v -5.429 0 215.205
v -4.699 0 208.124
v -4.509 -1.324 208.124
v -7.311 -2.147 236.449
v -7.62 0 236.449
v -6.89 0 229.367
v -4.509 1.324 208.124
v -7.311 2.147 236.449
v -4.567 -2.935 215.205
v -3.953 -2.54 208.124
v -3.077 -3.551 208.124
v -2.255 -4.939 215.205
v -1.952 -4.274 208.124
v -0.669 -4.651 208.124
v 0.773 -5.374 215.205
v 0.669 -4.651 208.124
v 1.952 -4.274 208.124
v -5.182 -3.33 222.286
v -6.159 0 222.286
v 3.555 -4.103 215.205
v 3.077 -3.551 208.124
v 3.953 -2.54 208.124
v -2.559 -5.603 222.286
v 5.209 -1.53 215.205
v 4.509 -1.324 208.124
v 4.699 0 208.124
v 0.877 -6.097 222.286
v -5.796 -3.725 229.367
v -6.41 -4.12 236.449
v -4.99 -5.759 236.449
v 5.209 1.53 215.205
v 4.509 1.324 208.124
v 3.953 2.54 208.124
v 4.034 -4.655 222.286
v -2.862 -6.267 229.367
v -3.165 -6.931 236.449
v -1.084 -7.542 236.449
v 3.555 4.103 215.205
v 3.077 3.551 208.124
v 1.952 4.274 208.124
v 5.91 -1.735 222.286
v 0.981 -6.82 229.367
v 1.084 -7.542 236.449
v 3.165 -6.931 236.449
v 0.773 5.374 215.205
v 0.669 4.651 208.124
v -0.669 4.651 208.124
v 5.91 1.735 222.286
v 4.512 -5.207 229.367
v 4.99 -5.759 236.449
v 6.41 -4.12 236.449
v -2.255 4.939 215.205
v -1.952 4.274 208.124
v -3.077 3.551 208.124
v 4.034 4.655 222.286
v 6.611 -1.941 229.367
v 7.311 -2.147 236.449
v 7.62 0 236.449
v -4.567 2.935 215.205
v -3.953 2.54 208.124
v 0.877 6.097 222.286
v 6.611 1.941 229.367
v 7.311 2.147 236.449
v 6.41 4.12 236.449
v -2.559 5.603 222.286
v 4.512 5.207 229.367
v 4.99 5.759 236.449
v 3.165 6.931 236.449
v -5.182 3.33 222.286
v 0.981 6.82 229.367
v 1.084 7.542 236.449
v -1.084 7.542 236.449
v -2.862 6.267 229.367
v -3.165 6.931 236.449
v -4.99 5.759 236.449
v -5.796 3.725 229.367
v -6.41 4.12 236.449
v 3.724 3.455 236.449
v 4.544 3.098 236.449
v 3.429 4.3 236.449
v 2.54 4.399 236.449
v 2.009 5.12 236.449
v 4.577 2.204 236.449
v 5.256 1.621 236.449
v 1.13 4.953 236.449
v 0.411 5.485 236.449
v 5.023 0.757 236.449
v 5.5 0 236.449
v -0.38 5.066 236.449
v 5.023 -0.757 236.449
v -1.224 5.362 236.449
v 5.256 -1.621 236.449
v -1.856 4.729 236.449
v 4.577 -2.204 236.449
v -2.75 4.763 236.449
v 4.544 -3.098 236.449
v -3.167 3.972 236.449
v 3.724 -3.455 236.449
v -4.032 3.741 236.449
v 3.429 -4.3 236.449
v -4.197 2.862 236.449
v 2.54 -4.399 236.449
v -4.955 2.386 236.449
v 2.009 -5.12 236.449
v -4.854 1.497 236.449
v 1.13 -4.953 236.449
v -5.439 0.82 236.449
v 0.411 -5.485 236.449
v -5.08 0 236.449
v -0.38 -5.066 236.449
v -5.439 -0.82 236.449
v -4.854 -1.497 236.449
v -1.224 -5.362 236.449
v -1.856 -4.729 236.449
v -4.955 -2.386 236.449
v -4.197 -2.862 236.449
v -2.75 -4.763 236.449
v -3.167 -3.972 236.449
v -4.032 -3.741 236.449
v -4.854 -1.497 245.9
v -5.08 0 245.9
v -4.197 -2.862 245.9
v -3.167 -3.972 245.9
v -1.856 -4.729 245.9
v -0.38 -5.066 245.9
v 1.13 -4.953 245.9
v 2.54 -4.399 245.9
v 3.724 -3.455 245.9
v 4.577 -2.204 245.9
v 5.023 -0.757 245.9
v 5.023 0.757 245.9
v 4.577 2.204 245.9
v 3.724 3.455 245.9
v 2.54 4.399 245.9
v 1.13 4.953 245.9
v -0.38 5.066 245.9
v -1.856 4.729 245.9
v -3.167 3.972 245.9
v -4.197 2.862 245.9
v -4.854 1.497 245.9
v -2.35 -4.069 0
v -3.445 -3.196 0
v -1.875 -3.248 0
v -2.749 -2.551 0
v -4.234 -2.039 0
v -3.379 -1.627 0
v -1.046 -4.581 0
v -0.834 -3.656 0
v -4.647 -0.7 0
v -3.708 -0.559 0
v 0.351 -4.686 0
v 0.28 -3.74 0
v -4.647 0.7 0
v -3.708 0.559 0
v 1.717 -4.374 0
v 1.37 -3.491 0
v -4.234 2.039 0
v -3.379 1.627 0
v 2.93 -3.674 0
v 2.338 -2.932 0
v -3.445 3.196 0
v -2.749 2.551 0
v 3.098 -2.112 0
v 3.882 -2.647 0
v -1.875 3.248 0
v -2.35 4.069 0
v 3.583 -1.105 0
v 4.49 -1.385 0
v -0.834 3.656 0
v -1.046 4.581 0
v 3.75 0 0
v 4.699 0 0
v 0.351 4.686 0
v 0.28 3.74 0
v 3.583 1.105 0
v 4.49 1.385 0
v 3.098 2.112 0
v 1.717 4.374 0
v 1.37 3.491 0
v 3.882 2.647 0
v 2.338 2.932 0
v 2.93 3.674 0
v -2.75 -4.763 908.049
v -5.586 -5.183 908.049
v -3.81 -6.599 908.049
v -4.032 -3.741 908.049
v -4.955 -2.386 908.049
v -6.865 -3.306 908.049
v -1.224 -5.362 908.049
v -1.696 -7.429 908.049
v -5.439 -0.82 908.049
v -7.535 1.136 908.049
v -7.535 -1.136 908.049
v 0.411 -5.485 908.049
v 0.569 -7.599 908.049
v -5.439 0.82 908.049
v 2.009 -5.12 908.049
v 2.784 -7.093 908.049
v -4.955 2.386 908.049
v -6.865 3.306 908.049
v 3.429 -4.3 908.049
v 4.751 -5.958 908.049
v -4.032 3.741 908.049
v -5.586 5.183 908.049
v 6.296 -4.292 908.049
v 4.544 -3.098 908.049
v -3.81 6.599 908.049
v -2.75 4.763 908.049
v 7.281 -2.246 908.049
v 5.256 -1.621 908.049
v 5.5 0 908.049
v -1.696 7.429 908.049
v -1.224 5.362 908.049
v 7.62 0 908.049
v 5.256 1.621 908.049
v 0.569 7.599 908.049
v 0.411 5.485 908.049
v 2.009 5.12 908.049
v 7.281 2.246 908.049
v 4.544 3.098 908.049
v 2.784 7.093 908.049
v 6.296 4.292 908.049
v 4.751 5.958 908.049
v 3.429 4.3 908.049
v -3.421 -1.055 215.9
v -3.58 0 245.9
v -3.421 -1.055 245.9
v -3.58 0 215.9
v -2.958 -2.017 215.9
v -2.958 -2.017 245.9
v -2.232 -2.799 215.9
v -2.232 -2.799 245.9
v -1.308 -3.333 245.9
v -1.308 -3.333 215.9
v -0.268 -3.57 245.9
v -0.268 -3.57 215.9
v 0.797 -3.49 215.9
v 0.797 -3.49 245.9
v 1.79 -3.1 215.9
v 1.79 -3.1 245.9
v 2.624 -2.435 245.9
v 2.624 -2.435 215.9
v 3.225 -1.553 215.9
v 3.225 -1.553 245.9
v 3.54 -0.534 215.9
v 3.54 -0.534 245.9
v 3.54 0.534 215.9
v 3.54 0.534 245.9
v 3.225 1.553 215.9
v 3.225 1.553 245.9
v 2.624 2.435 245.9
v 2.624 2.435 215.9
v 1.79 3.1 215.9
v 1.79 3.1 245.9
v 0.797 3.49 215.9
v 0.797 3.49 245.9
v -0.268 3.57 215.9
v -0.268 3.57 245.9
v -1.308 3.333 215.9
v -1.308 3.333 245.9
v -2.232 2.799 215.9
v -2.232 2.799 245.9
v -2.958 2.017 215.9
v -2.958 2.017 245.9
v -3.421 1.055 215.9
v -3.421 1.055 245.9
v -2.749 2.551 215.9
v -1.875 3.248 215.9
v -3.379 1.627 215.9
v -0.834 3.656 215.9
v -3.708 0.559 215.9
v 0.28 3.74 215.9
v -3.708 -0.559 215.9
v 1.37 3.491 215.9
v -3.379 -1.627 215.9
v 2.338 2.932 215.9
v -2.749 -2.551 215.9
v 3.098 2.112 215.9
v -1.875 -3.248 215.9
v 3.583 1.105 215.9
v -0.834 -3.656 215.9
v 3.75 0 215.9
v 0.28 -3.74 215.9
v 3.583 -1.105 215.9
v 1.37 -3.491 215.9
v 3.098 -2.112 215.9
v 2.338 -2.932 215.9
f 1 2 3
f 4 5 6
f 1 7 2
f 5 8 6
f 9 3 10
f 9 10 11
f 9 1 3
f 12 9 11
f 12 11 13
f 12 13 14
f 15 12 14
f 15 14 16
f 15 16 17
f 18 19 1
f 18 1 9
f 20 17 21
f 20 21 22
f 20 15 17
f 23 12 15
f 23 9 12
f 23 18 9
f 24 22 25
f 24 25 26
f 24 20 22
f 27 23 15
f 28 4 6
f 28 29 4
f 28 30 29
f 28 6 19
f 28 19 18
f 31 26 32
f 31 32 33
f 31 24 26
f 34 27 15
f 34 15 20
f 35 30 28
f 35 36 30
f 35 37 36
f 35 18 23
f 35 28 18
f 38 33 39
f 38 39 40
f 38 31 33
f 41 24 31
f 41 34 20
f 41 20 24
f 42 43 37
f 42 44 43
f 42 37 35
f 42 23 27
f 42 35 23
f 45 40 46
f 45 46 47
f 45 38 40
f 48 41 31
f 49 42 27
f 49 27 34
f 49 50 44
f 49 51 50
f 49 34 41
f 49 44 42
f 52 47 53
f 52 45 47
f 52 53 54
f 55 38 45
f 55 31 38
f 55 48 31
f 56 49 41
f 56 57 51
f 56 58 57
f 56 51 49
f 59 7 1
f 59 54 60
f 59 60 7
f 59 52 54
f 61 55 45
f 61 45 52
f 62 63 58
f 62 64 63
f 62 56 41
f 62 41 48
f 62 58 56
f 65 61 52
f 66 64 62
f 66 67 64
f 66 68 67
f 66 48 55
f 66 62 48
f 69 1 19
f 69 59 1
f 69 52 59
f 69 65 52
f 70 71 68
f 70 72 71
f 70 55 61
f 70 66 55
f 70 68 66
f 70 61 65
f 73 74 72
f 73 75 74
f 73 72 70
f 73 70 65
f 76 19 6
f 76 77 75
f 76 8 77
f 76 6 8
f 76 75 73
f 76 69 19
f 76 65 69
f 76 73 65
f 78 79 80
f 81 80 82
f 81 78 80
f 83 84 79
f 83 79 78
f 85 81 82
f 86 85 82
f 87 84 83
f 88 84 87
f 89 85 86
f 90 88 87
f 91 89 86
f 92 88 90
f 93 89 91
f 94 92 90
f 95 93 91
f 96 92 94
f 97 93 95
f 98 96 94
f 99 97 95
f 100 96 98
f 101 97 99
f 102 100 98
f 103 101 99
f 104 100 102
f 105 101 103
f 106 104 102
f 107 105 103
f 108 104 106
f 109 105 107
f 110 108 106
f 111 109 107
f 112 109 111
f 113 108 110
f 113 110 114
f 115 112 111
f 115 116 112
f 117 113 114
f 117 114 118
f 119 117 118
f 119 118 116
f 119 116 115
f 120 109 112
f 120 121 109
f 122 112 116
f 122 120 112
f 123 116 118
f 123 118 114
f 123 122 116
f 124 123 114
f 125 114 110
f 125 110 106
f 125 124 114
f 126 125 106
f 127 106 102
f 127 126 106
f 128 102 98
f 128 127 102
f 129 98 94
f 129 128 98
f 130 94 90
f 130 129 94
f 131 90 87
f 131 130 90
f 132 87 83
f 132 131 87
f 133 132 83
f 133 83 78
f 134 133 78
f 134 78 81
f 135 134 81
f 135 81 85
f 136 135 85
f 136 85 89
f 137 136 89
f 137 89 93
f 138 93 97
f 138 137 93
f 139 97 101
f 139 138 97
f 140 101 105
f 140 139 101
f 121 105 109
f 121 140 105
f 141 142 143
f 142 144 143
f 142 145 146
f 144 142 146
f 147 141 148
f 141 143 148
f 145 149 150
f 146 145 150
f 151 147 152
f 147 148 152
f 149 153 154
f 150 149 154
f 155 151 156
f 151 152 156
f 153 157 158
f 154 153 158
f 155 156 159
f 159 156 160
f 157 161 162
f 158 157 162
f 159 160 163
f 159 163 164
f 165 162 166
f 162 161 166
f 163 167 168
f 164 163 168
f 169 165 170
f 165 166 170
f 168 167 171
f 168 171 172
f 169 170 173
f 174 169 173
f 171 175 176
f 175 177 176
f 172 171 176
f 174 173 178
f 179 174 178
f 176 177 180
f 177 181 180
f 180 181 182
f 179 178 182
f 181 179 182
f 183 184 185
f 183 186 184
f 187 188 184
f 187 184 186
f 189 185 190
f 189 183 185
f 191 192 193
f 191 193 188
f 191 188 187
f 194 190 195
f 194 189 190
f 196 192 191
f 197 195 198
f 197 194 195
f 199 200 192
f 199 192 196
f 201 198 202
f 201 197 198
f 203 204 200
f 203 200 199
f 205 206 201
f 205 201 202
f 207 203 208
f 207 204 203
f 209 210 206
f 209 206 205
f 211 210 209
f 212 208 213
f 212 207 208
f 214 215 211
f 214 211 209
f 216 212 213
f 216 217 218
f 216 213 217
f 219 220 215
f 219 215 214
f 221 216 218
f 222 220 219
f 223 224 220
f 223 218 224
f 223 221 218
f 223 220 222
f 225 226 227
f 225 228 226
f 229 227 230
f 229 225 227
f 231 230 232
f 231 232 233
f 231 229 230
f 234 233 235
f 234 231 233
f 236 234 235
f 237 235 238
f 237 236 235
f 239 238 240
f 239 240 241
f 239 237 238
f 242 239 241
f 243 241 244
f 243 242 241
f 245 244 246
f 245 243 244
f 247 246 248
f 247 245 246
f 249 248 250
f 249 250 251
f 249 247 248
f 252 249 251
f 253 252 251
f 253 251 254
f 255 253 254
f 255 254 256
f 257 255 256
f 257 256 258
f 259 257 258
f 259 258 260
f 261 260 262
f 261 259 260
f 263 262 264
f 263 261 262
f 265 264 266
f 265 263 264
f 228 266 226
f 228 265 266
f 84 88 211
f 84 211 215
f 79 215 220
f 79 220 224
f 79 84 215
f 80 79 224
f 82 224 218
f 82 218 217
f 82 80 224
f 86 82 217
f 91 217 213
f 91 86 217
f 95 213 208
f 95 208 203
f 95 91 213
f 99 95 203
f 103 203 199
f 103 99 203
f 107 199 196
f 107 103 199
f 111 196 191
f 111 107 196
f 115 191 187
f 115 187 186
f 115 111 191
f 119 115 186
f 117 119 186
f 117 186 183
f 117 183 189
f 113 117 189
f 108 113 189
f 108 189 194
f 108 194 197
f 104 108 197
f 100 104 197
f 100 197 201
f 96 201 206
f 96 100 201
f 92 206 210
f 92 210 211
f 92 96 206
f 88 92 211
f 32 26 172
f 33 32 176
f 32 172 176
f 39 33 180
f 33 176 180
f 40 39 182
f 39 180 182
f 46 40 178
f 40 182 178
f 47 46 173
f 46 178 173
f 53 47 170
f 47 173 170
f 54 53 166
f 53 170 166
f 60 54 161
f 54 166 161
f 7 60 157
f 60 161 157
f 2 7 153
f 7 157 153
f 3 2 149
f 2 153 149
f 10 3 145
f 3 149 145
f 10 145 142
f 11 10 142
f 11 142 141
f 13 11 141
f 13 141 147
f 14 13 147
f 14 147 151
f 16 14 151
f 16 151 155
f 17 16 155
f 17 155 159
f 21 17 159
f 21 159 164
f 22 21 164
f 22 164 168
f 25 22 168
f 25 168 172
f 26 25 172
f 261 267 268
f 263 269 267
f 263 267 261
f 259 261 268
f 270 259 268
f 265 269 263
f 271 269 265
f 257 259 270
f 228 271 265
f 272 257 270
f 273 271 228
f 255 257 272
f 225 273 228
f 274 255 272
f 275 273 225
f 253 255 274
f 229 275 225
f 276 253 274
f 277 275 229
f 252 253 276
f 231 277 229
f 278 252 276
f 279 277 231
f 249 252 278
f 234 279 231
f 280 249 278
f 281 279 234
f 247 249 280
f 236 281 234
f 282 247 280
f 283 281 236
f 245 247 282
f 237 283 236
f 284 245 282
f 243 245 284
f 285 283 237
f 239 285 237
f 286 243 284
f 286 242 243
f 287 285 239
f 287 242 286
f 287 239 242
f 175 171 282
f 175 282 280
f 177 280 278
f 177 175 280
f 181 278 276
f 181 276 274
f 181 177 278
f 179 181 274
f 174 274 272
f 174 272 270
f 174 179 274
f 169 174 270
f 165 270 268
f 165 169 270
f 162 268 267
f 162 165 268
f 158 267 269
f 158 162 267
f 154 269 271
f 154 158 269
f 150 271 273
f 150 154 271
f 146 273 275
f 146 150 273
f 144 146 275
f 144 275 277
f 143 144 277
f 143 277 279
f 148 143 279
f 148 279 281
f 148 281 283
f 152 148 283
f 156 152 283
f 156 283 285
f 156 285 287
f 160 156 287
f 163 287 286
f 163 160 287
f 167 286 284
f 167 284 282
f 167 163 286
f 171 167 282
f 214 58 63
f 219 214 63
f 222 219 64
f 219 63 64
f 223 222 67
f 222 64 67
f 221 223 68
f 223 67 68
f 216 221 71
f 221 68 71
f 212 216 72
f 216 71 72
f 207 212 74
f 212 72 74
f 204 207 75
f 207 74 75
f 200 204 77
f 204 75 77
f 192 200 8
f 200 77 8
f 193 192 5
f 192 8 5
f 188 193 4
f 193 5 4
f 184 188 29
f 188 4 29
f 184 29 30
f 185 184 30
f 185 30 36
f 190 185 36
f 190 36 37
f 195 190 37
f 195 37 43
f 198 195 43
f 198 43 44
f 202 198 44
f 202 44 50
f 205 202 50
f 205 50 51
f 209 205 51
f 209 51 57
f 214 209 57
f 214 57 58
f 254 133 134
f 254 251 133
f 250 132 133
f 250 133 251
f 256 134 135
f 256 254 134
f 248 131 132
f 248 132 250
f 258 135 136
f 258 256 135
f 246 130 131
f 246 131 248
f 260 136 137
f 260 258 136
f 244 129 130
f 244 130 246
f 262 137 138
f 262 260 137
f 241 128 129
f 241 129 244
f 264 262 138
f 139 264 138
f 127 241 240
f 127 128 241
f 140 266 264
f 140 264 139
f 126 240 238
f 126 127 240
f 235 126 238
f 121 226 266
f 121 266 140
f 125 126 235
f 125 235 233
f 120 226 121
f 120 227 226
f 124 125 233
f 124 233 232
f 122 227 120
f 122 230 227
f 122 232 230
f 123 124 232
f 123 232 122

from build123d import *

# Parameters (mm, degrees)
SKETCH1_R           = 4.699
SKETCH1_R_2         = 3.75
BOSS_EXTRUDE1_DEPTH = 215.9
SKETCH6_R           = 7.62
SKETCH6_R_2         = 5.5
BOSS_EXTRUDE2_DEPTH = 671.6


with BuildPart() as part:
    # Sketch1 → Boss-Extrude1 (new body)
    with BuildSketch(Plane.XY):
        Circle(SKETCH1_R)
        Circle(SKETCH1_R_2, mode=Mode.SUBTRACT)
    extrude(amount=BOSS_EXTRUDE1_DEPTH)

    # Sketch5 → Revolve1 (revolve)
    with BuildSketch(Plane(origin=(0, 0, 0), x_dir=(1, 0, 0), z_dir=(0, 1, 0))):
        Polygon((-4.699, -208.123650762), (-7.62, -236.448520775), (-5.08, -236.448520775), (-5.08, -245.9), (-3.58, -245.9), (-3.58, -215.9), (-4.699, -215.9), align=None)
    revolve(axis=Axis((0, 0, 215.9), (0, 0, 1)))

    # Sketch6 → Boss-Extrude2 (add)
    with BuildSketch(Plane.XY.offset(236.448520775)):
        Circle(SKETCH6_R)
        Circle(SKETCH6_R_2, mode=Mode.SUBTRACT)
    extrude(amount=BOSS_EXTRUDE2_DEPTH)


solid = part.part
